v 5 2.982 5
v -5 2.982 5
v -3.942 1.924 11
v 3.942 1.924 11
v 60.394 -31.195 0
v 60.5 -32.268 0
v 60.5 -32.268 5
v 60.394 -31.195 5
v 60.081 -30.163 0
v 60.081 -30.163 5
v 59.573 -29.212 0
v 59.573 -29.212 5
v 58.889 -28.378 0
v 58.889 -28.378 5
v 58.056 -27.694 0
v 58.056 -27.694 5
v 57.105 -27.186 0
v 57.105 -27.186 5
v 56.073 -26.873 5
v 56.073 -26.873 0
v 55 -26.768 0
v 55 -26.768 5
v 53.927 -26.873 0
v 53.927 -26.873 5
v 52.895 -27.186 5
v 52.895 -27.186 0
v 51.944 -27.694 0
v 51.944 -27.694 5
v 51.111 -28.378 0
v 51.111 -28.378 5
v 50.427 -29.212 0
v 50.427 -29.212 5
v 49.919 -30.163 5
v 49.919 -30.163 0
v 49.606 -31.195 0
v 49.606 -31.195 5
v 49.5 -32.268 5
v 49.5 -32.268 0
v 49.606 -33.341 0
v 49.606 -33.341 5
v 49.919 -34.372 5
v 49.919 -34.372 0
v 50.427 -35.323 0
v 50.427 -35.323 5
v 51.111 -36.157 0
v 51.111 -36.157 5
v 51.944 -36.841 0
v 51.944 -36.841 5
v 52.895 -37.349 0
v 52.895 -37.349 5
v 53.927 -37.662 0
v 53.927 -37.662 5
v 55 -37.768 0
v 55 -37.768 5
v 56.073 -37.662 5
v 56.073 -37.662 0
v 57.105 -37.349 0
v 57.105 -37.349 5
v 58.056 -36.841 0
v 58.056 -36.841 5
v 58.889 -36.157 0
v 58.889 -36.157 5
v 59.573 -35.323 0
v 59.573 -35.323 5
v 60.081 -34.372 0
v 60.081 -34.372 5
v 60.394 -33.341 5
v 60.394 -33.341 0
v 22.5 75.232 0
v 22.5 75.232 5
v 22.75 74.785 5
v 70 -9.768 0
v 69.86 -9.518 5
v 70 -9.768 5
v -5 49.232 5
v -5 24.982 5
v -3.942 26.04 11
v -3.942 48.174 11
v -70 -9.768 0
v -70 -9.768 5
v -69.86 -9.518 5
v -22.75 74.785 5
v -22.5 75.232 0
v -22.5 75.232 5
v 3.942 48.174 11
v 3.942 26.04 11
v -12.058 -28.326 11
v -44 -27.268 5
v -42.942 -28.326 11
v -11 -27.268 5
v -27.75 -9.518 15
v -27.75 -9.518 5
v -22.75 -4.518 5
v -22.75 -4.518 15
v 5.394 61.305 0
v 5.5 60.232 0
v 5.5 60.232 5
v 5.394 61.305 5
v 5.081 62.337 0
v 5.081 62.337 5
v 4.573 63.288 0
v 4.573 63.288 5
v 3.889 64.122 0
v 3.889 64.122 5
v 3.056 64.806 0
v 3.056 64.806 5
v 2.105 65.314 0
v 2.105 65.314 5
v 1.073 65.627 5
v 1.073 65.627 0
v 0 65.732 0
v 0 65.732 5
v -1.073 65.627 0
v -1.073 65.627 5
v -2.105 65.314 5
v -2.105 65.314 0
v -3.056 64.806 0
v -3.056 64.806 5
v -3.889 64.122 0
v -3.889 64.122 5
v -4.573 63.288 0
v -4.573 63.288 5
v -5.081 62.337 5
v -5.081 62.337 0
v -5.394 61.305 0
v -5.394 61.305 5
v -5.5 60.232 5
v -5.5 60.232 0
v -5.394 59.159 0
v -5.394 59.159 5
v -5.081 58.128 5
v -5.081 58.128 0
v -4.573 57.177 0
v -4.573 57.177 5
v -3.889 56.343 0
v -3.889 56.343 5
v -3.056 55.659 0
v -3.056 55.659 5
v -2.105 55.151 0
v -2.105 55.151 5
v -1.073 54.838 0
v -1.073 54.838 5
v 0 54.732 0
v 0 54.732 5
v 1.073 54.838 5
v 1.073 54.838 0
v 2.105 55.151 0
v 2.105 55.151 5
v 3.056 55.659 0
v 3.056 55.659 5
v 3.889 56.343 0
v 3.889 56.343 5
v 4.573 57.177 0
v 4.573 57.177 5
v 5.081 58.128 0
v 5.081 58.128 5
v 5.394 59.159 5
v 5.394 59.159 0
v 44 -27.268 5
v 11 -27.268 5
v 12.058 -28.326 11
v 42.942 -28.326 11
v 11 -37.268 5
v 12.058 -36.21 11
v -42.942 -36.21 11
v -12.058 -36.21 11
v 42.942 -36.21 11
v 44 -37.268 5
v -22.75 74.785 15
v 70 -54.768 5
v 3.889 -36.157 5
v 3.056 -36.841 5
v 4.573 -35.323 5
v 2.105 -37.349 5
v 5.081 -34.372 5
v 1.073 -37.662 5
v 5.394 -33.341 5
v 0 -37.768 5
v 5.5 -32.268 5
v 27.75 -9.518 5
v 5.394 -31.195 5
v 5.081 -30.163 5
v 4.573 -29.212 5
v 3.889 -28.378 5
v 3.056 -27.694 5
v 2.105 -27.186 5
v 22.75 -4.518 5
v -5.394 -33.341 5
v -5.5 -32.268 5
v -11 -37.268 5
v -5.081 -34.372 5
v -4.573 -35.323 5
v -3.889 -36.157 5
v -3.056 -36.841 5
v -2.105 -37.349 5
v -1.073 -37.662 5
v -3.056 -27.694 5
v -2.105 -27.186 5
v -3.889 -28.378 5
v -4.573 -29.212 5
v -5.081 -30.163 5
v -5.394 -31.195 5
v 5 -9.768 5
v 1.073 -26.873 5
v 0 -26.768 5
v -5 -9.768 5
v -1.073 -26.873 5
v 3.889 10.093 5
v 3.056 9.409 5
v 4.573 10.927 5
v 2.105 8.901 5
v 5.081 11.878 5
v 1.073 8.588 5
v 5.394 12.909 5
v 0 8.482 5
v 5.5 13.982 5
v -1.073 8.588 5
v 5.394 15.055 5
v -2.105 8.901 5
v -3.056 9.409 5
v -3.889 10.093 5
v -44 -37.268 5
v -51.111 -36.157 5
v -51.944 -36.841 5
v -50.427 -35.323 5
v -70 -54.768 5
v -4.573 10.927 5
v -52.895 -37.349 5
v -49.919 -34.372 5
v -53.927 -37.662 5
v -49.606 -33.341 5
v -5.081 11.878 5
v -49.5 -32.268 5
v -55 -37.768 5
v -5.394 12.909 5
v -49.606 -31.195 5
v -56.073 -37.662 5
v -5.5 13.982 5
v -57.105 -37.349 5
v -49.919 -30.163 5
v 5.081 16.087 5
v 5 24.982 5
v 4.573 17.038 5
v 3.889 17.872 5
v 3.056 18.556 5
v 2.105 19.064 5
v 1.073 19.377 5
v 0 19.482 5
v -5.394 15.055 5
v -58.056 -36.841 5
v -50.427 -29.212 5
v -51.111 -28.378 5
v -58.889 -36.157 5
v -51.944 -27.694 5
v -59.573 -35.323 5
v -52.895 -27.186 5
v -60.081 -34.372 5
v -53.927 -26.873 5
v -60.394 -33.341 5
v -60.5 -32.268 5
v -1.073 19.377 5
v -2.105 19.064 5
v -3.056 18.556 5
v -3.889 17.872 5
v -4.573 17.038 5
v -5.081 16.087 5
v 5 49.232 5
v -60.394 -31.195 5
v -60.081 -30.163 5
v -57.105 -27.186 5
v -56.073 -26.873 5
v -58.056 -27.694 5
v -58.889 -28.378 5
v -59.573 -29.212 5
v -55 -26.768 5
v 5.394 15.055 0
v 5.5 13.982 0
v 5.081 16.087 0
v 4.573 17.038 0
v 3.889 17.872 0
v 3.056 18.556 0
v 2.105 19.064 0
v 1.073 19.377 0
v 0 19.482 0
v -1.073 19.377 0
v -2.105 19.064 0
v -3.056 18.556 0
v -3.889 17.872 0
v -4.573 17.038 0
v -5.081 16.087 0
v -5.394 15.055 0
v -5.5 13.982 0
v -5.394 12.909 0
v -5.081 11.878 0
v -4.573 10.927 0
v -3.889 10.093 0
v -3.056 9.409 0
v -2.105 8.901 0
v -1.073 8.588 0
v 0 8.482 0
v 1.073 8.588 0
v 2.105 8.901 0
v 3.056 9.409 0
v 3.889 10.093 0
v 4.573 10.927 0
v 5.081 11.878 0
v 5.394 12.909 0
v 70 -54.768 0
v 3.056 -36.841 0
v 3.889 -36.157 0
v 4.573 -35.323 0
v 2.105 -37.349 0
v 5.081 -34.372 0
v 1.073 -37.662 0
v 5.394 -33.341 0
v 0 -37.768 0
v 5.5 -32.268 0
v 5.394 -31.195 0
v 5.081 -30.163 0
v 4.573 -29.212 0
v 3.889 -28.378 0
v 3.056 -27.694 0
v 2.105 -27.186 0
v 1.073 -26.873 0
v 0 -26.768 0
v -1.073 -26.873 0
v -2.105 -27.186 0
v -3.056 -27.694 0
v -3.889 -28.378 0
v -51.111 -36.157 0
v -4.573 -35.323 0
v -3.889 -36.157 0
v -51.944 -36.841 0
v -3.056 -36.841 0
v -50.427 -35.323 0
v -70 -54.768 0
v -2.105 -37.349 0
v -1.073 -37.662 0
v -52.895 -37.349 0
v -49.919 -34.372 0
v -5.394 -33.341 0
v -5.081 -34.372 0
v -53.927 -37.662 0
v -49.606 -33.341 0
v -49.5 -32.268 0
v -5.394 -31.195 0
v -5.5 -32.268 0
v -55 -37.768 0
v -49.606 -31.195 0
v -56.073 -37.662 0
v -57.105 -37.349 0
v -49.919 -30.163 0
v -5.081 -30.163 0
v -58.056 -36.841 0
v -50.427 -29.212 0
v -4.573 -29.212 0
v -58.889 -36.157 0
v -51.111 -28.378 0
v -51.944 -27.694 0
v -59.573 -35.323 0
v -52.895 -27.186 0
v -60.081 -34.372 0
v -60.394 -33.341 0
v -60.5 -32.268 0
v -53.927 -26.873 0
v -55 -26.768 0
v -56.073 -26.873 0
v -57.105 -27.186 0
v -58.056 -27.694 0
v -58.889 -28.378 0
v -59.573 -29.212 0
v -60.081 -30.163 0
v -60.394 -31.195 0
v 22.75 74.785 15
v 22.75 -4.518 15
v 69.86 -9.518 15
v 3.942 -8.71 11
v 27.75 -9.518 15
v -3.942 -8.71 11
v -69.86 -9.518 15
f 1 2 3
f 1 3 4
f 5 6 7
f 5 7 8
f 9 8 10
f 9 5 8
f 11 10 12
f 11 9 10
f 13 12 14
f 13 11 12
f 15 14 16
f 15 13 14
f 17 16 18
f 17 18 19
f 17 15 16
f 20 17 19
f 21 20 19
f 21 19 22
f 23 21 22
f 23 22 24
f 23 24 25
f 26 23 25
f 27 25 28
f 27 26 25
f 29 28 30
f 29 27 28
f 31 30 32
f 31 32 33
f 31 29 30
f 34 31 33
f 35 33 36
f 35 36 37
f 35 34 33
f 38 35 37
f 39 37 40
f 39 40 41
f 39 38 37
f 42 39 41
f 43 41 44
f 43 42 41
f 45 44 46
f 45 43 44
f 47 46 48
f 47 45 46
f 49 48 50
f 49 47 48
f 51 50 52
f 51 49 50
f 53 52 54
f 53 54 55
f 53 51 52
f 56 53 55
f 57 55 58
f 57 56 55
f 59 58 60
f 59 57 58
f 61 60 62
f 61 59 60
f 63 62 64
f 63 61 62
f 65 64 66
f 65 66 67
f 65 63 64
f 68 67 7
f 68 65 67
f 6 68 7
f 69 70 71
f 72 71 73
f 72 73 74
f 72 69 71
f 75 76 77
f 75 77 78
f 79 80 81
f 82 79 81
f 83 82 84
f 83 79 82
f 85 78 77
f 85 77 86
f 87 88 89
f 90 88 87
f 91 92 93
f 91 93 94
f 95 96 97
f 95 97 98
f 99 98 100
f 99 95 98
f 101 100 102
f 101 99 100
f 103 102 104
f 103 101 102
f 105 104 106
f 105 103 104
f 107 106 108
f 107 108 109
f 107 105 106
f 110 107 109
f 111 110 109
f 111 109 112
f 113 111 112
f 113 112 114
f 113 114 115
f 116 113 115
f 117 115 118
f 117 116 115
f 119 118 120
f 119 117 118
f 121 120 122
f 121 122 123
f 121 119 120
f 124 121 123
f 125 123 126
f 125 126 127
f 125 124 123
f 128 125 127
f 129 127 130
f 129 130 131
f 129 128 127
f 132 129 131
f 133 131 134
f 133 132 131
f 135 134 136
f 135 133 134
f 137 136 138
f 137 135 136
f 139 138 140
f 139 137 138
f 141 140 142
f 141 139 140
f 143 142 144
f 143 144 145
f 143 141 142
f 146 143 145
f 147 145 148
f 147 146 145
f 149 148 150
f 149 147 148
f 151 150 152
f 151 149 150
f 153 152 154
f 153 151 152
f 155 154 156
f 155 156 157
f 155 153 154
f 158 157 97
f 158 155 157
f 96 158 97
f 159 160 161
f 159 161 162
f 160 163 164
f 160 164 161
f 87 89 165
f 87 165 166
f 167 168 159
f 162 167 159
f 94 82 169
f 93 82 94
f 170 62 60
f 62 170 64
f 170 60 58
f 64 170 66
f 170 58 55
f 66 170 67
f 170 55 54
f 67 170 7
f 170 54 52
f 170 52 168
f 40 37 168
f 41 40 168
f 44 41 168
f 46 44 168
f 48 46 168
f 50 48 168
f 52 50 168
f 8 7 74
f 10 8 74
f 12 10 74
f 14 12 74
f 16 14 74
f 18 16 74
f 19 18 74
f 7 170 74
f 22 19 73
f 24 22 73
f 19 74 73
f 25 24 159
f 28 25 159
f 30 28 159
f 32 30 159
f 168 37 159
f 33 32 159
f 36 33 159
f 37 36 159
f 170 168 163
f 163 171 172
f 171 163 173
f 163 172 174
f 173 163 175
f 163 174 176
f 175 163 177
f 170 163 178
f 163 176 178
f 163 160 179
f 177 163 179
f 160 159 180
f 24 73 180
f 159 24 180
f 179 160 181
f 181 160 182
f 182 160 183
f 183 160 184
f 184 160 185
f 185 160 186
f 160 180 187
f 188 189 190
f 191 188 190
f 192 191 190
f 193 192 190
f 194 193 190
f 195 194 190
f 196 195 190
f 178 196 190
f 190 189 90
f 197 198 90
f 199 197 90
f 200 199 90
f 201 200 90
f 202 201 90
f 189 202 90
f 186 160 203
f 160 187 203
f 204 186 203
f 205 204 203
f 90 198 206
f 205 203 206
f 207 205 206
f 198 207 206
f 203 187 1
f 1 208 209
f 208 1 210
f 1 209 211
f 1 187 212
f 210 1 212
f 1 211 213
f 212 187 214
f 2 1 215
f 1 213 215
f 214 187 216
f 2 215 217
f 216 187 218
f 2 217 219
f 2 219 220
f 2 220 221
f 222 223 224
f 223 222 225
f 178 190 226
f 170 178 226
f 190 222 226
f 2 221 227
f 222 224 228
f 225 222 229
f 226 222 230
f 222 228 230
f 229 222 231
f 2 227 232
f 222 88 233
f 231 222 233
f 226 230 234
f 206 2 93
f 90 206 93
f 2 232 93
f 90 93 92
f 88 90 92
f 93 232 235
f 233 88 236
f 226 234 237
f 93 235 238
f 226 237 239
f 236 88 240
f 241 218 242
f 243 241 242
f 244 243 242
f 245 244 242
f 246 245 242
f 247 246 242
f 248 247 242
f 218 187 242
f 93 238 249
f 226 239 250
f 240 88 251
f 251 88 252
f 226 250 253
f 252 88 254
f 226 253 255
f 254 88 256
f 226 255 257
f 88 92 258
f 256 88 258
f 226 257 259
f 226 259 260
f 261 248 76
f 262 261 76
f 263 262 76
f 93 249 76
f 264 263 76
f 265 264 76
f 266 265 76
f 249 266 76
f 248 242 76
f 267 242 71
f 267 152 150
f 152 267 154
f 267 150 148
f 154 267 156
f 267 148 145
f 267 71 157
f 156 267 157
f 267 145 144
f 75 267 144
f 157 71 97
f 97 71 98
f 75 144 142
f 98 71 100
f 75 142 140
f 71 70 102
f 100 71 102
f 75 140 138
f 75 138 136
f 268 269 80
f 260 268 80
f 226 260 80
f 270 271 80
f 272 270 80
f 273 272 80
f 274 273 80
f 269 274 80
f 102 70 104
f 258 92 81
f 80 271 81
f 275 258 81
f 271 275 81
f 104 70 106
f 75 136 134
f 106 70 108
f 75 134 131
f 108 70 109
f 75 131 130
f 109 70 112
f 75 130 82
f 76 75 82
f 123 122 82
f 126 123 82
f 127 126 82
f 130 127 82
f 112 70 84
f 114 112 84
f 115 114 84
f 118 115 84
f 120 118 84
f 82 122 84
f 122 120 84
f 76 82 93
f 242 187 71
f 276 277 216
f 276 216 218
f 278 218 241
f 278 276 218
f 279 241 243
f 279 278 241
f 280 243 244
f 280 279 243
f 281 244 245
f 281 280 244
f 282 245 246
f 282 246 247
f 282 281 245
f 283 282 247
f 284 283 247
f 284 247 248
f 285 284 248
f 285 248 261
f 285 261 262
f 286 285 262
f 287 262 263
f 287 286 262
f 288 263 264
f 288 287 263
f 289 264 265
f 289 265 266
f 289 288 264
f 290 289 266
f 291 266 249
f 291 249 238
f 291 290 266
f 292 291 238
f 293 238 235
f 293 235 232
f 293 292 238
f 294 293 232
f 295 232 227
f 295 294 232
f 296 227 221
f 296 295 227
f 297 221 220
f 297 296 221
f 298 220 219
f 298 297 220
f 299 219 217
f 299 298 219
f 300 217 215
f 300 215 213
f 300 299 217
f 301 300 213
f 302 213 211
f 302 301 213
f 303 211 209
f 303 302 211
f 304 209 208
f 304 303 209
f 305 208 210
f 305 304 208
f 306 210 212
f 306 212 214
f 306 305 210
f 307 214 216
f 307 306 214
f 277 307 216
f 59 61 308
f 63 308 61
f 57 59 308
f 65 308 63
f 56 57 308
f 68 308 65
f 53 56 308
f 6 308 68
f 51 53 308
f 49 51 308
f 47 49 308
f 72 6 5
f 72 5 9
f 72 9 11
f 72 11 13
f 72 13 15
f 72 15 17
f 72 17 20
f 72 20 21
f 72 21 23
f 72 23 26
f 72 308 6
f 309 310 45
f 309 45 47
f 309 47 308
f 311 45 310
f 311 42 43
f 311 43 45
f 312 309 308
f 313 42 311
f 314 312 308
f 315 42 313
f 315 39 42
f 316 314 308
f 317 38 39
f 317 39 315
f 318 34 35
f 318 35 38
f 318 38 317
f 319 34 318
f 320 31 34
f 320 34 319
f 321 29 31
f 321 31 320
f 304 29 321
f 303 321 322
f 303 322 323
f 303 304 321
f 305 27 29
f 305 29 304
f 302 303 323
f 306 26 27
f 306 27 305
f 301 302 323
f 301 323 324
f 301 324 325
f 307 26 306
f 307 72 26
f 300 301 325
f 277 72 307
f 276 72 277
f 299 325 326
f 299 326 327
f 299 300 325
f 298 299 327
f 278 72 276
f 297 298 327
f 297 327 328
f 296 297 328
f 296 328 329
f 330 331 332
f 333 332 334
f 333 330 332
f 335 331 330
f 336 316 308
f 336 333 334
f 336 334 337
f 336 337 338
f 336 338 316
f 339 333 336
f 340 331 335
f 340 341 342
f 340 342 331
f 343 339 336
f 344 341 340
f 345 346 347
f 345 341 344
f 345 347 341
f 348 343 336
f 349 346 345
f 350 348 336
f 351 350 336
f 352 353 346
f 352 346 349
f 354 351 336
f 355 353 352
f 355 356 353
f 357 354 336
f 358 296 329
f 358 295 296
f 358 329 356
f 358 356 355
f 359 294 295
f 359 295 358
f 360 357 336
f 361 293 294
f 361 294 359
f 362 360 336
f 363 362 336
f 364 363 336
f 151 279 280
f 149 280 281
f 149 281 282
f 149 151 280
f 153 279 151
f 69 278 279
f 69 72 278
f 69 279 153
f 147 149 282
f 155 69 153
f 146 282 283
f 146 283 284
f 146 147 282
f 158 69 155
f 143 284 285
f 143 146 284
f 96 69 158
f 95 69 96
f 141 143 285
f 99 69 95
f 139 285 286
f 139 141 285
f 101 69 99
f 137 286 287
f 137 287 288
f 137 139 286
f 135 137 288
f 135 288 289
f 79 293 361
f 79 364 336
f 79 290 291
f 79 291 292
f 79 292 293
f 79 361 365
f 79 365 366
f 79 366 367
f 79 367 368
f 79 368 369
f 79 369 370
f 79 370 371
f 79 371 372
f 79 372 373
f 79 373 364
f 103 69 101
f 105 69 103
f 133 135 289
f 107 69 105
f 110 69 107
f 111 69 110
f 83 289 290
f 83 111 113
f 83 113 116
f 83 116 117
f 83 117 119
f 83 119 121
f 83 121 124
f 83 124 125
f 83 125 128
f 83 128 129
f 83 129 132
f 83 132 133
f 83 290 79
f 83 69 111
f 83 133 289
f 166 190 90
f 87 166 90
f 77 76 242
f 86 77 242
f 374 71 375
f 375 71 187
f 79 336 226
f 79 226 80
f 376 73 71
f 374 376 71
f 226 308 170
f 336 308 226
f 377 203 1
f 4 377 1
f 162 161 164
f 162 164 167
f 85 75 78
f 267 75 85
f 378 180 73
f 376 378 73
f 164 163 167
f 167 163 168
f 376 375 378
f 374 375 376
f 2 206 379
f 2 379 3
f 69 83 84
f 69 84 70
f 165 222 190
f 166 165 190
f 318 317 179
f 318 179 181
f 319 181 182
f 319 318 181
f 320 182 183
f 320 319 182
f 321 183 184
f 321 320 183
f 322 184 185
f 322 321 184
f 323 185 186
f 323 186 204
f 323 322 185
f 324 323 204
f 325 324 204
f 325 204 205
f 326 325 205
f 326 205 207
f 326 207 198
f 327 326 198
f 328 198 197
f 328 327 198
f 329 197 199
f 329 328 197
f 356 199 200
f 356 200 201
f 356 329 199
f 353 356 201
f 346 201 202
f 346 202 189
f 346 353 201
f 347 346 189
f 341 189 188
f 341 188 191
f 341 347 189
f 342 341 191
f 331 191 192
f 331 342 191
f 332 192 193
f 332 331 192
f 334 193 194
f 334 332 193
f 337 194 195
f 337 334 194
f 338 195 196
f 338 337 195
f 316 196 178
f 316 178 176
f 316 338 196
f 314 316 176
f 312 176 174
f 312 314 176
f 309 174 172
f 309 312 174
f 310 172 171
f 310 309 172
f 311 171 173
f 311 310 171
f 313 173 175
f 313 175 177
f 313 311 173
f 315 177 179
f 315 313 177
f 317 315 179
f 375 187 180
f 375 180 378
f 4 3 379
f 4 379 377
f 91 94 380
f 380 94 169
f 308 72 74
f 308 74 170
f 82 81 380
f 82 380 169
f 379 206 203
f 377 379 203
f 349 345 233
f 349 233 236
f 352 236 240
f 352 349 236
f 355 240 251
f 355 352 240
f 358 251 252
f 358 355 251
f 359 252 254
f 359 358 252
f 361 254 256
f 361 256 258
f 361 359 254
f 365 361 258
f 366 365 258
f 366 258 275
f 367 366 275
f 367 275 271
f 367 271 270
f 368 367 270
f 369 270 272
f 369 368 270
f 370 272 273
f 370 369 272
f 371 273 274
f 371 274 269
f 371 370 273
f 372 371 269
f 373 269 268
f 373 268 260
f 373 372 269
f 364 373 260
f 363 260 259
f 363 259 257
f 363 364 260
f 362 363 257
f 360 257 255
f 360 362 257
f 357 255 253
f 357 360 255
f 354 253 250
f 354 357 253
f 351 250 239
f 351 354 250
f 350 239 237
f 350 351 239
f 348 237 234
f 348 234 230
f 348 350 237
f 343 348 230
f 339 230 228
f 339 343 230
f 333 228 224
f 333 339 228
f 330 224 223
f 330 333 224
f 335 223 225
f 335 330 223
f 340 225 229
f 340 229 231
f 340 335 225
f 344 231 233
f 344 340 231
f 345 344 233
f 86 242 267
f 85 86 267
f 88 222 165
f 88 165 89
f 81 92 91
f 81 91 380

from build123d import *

# Parameters (mm, degrees)
ESQUISSE1_R        = 5.5
BOSS_EXTRU_1_DEPTH = 5
ESQUISSE2_W        = 33
ESQUISSE2_H        = 10
ESQUISSE2_W_2      = 10
ESQUISSE2_H_2      = 24.25
ESQUISSE2_H_3      = 12.75
BOSS_EXTRU_2_DEPTH = 6
D_POUILLE1_ANGLE   = 10
BOSS_EXTRU_3_DEPTH = 10
CHANFREIN1_SIZE    = 5


with BuildPart() as part:
    # Esquisse1 → Boss.-Extru.1 (new body)
    with BuildSketch(Plane.XY):
        Polygon((-22.5, 75.232443508), (22.5, 75.232443508), (70, -9.767556492), (70, -54.767556492), (-70, -54.767556492), (-70, -9.767556492), align=None)
        with Locations((0, 60.232443508)):
            Circle(ESQUISSE1_R, mode=Mode.SUBTRACT)
        with Locations((0, 13.982443508)):
            Circle(ESQUISSE1_R, mode=Mode.SUBTRACT)
        with Locations((0, -32.267556492)):
            Circle(ESQUISSE1_R, mode=Mode.SUBTRACT)
        with Locations((-55, -32.267556492)):
            Circle(ESQUISSE1_R, mode=Mode.SUBTRACT)
        with Locations((55, -32.267556492)):
            Circle(ESQUISSE1_R, mode=Mode.SUBTRACT)
    extrude(amount=BOSS_EXTRU_1_DEPTH)

    # Esquisse2 → Boss.-Extru.2 (add)
    with BuildSketch(Plane.XY.offset(5)):
        with Locations((-27.5, -32.267556492)):
            Rectangle(ESQUISSE2_W, ESQUISSE2_H)
        with Locations((27.5, -32.267556492)):
            Rectangle(ESQUISSE2_W, ESQUISSE2_H)
        with Locations((0, 37.107443508)):
            Rectangle(ESQUISSE2_W_2, ESQUISSE2_H_2)
        with Locations((0, -3.392556492)):
            Rectangle(ESQUISSE2_W_2, ESQUISSE2_H_3)
    extrude(amount=BOSS_EXTRU_2_DEPTH)

    # Dépouille1
    d_pouille1_faces = [part.faces().sort_by_distance(p)[0] for p in [
        (44, -32.267556492, 8),
        (27.5, -27.267556492, 8),
        (-11, -32.267556492, 8),
        (-27.5, -27.267556492, 8),
        (0, 2.982443508, 8),
        (5, -3.392556492, 8),
        (0, 49.232443508, 8),
        (5, 37.107443508, 8),
        (-5, 37.107443508, 8),
        (0, 24.982443508, 8),
        (11, -32.267556492, 8),
        (-44, -32.267556492, 8),
        (-5, -3.392556492, 8),
        (-27.5, -37.267556492, 8),
        (27.5, -37.267556492, 8),
        (0, -9.767556492, 8),
    ]]
    draft(d_pouille1_faces, Plane.XY.offset(5), D_POUILLE1_ANGLE)

    # Esquisse3 → Boss.-Extru.3 (add)
    with BuildSketch(Plane.XY.offset(5)):
        Polygon((-22.75, 74.785075087), (-22.75, -9.517556492), (-69.860294118, -9.517556492), align=None)
        Polygon((22.75, -9.517556492), (69.860294118, -9.517556492), (22.75, 74.785075087), align=None)
    extrude(amount=BOSS_EXTRU_3_DEPTH)

    # Chanfrein1
    chanfrein1_edges = [part.edges().sort_by_distance(p)[0] for p in [
        (-22.75, -9.517556492, 10),
        (22.75, -9.517556492, 10),
    ]]
    chamfer(chanfrein1_edges, length=CHANFREIN1_SIZE)


solid = part.part
